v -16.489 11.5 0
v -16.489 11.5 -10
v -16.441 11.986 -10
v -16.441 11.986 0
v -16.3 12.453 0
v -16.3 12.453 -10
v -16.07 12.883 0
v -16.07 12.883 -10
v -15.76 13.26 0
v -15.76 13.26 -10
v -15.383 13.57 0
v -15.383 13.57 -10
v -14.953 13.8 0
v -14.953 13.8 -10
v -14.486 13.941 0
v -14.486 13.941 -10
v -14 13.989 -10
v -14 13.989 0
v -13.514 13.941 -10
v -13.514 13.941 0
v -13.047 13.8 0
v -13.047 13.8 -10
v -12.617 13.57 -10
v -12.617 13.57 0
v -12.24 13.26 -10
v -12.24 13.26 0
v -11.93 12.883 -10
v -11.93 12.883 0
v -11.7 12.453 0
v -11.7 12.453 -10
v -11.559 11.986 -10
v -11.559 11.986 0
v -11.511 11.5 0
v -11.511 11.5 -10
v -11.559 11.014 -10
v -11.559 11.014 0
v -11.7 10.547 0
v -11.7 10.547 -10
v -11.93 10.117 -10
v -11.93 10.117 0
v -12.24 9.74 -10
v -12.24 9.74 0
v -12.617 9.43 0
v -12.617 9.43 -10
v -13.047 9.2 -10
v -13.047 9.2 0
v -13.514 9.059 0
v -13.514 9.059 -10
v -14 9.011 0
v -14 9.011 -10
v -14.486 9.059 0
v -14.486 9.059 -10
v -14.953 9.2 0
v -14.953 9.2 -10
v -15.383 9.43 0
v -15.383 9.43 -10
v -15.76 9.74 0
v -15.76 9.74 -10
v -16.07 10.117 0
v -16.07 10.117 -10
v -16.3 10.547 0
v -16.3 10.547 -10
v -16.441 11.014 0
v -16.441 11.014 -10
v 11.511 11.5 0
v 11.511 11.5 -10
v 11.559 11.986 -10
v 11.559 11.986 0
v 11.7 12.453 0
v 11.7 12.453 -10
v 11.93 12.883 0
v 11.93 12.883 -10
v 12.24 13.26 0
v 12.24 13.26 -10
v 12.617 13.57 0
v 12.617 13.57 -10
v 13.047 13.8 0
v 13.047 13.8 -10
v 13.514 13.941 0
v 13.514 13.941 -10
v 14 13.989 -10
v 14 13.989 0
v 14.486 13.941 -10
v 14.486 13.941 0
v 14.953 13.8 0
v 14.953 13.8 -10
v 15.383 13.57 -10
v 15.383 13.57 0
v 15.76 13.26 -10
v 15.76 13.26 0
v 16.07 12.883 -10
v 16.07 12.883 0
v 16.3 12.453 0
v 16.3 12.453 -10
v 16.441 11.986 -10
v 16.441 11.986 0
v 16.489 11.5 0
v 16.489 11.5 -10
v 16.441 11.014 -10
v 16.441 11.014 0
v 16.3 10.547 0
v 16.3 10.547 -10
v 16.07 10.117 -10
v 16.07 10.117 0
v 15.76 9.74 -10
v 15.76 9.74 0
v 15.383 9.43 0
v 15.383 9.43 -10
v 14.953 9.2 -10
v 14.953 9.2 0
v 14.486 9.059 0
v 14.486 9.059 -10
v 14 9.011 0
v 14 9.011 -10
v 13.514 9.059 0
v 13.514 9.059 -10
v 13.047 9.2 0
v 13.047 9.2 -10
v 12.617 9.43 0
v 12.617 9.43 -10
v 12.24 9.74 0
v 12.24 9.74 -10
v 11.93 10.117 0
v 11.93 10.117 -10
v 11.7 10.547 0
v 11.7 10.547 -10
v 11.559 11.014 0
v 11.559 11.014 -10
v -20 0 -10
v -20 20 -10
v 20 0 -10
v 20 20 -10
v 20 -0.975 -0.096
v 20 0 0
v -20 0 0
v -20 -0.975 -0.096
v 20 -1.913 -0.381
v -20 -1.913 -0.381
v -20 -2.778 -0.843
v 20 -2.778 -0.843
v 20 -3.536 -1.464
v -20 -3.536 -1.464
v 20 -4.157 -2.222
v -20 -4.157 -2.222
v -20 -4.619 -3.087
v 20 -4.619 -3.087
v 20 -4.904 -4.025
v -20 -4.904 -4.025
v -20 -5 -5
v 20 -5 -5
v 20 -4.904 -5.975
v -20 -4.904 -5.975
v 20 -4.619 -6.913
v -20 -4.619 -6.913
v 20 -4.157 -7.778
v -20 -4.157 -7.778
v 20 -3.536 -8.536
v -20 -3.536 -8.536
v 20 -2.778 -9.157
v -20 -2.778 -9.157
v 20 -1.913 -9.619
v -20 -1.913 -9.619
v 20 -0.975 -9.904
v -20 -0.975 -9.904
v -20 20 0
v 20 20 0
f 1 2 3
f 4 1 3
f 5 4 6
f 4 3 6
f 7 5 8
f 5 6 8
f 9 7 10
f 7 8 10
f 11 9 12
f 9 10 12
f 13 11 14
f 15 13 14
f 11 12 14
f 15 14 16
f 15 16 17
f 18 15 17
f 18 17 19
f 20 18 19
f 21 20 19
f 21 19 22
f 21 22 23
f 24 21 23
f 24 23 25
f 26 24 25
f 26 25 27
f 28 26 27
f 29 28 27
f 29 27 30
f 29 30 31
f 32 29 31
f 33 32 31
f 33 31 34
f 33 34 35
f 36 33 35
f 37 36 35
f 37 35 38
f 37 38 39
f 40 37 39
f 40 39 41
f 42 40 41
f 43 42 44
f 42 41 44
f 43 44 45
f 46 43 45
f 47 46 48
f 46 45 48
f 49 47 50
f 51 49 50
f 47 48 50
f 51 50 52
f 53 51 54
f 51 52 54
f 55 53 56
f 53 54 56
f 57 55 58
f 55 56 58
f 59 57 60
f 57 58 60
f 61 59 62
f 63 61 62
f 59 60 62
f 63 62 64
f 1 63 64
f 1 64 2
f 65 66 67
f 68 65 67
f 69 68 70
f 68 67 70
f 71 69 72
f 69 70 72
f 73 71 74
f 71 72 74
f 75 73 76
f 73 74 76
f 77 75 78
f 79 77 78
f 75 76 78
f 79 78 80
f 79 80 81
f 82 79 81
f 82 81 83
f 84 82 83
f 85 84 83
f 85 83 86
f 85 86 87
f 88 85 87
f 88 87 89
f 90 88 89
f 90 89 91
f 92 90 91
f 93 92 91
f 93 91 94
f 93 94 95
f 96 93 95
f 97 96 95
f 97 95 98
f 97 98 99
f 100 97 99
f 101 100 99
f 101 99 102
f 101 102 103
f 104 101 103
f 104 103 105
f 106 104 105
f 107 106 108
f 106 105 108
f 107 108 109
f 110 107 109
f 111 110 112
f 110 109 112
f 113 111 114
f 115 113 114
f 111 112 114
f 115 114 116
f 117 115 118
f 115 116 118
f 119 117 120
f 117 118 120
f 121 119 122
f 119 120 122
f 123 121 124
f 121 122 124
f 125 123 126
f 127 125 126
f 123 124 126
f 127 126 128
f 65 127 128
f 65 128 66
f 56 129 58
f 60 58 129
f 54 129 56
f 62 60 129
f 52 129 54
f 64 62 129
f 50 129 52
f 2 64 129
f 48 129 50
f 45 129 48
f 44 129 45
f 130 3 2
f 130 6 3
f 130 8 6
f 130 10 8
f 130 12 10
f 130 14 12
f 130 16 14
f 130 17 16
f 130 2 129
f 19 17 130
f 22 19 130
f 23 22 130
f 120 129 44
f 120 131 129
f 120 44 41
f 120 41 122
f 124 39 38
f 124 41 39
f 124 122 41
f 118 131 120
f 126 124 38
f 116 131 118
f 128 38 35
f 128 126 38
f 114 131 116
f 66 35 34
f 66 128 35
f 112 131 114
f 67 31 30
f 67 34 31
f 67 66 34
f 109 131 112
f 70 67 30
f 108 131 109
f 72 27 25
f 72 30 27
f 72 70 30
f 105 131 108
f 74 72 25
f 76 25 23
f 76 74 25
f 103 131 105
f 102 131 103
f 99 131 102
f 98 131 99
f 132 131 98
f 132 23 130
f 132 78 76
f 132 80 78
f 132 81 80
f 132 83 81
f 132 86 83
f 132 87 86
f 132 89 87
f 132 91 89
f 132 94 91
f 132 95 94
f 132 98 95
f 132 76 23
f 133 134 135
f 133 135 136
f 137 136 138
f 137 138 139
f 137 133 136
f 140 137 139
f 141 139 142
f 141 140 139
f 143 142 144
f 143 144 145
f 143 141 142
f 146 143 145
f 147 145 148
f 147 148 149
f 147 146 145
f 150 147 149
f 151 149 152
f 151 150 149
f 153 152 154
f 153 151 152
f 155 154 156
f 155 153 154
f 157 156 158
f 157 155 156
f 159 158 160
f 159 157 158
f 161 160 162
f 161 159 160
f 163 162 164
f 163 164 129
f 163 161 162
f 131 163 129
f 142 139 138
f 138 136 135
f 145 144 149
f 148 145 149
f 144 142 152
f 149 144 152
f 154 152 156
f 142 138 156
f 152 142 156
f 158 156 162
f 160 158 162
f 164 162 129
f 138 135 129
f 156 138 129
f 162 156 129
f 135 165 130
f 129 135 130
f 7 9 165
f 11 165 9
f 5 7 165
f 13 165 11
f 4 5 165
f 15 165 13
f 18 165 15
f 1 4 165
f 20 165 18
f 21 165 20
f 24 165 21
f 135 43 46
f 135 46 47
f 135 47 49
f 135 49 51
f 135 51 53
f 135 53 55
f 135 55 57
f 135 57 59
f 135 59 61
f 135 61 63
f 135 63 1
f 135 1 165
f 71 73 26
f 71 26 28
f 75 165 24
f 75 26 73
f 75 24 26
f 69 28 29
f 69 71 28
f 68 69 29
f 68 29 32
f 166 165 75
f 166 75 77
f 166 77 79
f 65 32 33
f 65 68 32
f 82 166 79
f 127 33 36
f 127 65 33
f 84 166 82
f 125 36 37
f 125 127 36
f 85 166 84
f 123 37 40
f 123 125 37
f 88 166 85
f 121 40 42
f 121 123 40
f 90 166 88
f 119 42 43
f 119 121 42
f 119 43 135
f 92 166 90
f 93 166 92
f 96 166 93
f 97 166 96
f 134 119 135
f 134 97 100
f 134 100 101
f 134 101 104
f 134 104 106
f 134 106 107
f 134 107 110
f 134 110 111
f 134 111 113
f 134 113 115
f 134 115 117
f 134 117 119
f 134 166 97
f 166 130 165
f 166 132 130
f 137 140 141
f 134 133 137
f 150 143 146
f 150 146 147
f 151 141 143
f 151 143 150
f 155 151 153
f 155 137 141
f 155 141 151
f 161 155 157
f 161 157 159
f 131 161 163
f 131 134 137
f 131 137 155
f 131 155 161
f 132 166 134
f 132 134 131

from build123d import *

# Parameters (mm, degrees)
BOSS_EXTRUDE1_DEPTH        = 20
F_10_CLEARANCE_HOLE1_D     = 4.9784
F_10_CLEARANCE_HOLE1_DEPTH = 29.83
F_10_CLEARANCE_HOLE1_TIP   = 1.495662253


with BuildPart() as part:
    # Sketch2 → Boss-Extrude1 (new body, symmetric)
    with BuildSketch(Plane(origin=(0, 0, 0), x_dir=(0, 0, -1), z_dir=(1, 0, 0))):
        with BuildLine():
            Line((0, 20), (0, 0))
            ThreePointArc((0, 0), (5, -5), (10, 0))
            Line((10, 0), (10, 20))
            Line((10, 20), (0, 20))
        make_face()
    extrude(amount=BOSS_EXTRUDE1_DEPTH, both=True)

    # #10 Clearance Hole1
    with Locations(Plane.XY):
        with Locations((-14, 11.5), (14, 11.5)):
            Hole(F_10_CLEARANCE_HOLE1_D / 2, depth=F_10_CLEARANCE_HOLE1_DEPTH)
            with Locations((0, 0, -(F_10_CLEARANCE_HOLE1_DEPTH + F_10_CLEARANCE_HOLE1_TIP / 2))):  # 118° drill point
                Cone(0, F_10_CLEARANCE_HOLE1_D / 2, F_10_CLEARANCE_HOLE1_TIP, mode=Mode.SUBTRACT)


solid = part.part
